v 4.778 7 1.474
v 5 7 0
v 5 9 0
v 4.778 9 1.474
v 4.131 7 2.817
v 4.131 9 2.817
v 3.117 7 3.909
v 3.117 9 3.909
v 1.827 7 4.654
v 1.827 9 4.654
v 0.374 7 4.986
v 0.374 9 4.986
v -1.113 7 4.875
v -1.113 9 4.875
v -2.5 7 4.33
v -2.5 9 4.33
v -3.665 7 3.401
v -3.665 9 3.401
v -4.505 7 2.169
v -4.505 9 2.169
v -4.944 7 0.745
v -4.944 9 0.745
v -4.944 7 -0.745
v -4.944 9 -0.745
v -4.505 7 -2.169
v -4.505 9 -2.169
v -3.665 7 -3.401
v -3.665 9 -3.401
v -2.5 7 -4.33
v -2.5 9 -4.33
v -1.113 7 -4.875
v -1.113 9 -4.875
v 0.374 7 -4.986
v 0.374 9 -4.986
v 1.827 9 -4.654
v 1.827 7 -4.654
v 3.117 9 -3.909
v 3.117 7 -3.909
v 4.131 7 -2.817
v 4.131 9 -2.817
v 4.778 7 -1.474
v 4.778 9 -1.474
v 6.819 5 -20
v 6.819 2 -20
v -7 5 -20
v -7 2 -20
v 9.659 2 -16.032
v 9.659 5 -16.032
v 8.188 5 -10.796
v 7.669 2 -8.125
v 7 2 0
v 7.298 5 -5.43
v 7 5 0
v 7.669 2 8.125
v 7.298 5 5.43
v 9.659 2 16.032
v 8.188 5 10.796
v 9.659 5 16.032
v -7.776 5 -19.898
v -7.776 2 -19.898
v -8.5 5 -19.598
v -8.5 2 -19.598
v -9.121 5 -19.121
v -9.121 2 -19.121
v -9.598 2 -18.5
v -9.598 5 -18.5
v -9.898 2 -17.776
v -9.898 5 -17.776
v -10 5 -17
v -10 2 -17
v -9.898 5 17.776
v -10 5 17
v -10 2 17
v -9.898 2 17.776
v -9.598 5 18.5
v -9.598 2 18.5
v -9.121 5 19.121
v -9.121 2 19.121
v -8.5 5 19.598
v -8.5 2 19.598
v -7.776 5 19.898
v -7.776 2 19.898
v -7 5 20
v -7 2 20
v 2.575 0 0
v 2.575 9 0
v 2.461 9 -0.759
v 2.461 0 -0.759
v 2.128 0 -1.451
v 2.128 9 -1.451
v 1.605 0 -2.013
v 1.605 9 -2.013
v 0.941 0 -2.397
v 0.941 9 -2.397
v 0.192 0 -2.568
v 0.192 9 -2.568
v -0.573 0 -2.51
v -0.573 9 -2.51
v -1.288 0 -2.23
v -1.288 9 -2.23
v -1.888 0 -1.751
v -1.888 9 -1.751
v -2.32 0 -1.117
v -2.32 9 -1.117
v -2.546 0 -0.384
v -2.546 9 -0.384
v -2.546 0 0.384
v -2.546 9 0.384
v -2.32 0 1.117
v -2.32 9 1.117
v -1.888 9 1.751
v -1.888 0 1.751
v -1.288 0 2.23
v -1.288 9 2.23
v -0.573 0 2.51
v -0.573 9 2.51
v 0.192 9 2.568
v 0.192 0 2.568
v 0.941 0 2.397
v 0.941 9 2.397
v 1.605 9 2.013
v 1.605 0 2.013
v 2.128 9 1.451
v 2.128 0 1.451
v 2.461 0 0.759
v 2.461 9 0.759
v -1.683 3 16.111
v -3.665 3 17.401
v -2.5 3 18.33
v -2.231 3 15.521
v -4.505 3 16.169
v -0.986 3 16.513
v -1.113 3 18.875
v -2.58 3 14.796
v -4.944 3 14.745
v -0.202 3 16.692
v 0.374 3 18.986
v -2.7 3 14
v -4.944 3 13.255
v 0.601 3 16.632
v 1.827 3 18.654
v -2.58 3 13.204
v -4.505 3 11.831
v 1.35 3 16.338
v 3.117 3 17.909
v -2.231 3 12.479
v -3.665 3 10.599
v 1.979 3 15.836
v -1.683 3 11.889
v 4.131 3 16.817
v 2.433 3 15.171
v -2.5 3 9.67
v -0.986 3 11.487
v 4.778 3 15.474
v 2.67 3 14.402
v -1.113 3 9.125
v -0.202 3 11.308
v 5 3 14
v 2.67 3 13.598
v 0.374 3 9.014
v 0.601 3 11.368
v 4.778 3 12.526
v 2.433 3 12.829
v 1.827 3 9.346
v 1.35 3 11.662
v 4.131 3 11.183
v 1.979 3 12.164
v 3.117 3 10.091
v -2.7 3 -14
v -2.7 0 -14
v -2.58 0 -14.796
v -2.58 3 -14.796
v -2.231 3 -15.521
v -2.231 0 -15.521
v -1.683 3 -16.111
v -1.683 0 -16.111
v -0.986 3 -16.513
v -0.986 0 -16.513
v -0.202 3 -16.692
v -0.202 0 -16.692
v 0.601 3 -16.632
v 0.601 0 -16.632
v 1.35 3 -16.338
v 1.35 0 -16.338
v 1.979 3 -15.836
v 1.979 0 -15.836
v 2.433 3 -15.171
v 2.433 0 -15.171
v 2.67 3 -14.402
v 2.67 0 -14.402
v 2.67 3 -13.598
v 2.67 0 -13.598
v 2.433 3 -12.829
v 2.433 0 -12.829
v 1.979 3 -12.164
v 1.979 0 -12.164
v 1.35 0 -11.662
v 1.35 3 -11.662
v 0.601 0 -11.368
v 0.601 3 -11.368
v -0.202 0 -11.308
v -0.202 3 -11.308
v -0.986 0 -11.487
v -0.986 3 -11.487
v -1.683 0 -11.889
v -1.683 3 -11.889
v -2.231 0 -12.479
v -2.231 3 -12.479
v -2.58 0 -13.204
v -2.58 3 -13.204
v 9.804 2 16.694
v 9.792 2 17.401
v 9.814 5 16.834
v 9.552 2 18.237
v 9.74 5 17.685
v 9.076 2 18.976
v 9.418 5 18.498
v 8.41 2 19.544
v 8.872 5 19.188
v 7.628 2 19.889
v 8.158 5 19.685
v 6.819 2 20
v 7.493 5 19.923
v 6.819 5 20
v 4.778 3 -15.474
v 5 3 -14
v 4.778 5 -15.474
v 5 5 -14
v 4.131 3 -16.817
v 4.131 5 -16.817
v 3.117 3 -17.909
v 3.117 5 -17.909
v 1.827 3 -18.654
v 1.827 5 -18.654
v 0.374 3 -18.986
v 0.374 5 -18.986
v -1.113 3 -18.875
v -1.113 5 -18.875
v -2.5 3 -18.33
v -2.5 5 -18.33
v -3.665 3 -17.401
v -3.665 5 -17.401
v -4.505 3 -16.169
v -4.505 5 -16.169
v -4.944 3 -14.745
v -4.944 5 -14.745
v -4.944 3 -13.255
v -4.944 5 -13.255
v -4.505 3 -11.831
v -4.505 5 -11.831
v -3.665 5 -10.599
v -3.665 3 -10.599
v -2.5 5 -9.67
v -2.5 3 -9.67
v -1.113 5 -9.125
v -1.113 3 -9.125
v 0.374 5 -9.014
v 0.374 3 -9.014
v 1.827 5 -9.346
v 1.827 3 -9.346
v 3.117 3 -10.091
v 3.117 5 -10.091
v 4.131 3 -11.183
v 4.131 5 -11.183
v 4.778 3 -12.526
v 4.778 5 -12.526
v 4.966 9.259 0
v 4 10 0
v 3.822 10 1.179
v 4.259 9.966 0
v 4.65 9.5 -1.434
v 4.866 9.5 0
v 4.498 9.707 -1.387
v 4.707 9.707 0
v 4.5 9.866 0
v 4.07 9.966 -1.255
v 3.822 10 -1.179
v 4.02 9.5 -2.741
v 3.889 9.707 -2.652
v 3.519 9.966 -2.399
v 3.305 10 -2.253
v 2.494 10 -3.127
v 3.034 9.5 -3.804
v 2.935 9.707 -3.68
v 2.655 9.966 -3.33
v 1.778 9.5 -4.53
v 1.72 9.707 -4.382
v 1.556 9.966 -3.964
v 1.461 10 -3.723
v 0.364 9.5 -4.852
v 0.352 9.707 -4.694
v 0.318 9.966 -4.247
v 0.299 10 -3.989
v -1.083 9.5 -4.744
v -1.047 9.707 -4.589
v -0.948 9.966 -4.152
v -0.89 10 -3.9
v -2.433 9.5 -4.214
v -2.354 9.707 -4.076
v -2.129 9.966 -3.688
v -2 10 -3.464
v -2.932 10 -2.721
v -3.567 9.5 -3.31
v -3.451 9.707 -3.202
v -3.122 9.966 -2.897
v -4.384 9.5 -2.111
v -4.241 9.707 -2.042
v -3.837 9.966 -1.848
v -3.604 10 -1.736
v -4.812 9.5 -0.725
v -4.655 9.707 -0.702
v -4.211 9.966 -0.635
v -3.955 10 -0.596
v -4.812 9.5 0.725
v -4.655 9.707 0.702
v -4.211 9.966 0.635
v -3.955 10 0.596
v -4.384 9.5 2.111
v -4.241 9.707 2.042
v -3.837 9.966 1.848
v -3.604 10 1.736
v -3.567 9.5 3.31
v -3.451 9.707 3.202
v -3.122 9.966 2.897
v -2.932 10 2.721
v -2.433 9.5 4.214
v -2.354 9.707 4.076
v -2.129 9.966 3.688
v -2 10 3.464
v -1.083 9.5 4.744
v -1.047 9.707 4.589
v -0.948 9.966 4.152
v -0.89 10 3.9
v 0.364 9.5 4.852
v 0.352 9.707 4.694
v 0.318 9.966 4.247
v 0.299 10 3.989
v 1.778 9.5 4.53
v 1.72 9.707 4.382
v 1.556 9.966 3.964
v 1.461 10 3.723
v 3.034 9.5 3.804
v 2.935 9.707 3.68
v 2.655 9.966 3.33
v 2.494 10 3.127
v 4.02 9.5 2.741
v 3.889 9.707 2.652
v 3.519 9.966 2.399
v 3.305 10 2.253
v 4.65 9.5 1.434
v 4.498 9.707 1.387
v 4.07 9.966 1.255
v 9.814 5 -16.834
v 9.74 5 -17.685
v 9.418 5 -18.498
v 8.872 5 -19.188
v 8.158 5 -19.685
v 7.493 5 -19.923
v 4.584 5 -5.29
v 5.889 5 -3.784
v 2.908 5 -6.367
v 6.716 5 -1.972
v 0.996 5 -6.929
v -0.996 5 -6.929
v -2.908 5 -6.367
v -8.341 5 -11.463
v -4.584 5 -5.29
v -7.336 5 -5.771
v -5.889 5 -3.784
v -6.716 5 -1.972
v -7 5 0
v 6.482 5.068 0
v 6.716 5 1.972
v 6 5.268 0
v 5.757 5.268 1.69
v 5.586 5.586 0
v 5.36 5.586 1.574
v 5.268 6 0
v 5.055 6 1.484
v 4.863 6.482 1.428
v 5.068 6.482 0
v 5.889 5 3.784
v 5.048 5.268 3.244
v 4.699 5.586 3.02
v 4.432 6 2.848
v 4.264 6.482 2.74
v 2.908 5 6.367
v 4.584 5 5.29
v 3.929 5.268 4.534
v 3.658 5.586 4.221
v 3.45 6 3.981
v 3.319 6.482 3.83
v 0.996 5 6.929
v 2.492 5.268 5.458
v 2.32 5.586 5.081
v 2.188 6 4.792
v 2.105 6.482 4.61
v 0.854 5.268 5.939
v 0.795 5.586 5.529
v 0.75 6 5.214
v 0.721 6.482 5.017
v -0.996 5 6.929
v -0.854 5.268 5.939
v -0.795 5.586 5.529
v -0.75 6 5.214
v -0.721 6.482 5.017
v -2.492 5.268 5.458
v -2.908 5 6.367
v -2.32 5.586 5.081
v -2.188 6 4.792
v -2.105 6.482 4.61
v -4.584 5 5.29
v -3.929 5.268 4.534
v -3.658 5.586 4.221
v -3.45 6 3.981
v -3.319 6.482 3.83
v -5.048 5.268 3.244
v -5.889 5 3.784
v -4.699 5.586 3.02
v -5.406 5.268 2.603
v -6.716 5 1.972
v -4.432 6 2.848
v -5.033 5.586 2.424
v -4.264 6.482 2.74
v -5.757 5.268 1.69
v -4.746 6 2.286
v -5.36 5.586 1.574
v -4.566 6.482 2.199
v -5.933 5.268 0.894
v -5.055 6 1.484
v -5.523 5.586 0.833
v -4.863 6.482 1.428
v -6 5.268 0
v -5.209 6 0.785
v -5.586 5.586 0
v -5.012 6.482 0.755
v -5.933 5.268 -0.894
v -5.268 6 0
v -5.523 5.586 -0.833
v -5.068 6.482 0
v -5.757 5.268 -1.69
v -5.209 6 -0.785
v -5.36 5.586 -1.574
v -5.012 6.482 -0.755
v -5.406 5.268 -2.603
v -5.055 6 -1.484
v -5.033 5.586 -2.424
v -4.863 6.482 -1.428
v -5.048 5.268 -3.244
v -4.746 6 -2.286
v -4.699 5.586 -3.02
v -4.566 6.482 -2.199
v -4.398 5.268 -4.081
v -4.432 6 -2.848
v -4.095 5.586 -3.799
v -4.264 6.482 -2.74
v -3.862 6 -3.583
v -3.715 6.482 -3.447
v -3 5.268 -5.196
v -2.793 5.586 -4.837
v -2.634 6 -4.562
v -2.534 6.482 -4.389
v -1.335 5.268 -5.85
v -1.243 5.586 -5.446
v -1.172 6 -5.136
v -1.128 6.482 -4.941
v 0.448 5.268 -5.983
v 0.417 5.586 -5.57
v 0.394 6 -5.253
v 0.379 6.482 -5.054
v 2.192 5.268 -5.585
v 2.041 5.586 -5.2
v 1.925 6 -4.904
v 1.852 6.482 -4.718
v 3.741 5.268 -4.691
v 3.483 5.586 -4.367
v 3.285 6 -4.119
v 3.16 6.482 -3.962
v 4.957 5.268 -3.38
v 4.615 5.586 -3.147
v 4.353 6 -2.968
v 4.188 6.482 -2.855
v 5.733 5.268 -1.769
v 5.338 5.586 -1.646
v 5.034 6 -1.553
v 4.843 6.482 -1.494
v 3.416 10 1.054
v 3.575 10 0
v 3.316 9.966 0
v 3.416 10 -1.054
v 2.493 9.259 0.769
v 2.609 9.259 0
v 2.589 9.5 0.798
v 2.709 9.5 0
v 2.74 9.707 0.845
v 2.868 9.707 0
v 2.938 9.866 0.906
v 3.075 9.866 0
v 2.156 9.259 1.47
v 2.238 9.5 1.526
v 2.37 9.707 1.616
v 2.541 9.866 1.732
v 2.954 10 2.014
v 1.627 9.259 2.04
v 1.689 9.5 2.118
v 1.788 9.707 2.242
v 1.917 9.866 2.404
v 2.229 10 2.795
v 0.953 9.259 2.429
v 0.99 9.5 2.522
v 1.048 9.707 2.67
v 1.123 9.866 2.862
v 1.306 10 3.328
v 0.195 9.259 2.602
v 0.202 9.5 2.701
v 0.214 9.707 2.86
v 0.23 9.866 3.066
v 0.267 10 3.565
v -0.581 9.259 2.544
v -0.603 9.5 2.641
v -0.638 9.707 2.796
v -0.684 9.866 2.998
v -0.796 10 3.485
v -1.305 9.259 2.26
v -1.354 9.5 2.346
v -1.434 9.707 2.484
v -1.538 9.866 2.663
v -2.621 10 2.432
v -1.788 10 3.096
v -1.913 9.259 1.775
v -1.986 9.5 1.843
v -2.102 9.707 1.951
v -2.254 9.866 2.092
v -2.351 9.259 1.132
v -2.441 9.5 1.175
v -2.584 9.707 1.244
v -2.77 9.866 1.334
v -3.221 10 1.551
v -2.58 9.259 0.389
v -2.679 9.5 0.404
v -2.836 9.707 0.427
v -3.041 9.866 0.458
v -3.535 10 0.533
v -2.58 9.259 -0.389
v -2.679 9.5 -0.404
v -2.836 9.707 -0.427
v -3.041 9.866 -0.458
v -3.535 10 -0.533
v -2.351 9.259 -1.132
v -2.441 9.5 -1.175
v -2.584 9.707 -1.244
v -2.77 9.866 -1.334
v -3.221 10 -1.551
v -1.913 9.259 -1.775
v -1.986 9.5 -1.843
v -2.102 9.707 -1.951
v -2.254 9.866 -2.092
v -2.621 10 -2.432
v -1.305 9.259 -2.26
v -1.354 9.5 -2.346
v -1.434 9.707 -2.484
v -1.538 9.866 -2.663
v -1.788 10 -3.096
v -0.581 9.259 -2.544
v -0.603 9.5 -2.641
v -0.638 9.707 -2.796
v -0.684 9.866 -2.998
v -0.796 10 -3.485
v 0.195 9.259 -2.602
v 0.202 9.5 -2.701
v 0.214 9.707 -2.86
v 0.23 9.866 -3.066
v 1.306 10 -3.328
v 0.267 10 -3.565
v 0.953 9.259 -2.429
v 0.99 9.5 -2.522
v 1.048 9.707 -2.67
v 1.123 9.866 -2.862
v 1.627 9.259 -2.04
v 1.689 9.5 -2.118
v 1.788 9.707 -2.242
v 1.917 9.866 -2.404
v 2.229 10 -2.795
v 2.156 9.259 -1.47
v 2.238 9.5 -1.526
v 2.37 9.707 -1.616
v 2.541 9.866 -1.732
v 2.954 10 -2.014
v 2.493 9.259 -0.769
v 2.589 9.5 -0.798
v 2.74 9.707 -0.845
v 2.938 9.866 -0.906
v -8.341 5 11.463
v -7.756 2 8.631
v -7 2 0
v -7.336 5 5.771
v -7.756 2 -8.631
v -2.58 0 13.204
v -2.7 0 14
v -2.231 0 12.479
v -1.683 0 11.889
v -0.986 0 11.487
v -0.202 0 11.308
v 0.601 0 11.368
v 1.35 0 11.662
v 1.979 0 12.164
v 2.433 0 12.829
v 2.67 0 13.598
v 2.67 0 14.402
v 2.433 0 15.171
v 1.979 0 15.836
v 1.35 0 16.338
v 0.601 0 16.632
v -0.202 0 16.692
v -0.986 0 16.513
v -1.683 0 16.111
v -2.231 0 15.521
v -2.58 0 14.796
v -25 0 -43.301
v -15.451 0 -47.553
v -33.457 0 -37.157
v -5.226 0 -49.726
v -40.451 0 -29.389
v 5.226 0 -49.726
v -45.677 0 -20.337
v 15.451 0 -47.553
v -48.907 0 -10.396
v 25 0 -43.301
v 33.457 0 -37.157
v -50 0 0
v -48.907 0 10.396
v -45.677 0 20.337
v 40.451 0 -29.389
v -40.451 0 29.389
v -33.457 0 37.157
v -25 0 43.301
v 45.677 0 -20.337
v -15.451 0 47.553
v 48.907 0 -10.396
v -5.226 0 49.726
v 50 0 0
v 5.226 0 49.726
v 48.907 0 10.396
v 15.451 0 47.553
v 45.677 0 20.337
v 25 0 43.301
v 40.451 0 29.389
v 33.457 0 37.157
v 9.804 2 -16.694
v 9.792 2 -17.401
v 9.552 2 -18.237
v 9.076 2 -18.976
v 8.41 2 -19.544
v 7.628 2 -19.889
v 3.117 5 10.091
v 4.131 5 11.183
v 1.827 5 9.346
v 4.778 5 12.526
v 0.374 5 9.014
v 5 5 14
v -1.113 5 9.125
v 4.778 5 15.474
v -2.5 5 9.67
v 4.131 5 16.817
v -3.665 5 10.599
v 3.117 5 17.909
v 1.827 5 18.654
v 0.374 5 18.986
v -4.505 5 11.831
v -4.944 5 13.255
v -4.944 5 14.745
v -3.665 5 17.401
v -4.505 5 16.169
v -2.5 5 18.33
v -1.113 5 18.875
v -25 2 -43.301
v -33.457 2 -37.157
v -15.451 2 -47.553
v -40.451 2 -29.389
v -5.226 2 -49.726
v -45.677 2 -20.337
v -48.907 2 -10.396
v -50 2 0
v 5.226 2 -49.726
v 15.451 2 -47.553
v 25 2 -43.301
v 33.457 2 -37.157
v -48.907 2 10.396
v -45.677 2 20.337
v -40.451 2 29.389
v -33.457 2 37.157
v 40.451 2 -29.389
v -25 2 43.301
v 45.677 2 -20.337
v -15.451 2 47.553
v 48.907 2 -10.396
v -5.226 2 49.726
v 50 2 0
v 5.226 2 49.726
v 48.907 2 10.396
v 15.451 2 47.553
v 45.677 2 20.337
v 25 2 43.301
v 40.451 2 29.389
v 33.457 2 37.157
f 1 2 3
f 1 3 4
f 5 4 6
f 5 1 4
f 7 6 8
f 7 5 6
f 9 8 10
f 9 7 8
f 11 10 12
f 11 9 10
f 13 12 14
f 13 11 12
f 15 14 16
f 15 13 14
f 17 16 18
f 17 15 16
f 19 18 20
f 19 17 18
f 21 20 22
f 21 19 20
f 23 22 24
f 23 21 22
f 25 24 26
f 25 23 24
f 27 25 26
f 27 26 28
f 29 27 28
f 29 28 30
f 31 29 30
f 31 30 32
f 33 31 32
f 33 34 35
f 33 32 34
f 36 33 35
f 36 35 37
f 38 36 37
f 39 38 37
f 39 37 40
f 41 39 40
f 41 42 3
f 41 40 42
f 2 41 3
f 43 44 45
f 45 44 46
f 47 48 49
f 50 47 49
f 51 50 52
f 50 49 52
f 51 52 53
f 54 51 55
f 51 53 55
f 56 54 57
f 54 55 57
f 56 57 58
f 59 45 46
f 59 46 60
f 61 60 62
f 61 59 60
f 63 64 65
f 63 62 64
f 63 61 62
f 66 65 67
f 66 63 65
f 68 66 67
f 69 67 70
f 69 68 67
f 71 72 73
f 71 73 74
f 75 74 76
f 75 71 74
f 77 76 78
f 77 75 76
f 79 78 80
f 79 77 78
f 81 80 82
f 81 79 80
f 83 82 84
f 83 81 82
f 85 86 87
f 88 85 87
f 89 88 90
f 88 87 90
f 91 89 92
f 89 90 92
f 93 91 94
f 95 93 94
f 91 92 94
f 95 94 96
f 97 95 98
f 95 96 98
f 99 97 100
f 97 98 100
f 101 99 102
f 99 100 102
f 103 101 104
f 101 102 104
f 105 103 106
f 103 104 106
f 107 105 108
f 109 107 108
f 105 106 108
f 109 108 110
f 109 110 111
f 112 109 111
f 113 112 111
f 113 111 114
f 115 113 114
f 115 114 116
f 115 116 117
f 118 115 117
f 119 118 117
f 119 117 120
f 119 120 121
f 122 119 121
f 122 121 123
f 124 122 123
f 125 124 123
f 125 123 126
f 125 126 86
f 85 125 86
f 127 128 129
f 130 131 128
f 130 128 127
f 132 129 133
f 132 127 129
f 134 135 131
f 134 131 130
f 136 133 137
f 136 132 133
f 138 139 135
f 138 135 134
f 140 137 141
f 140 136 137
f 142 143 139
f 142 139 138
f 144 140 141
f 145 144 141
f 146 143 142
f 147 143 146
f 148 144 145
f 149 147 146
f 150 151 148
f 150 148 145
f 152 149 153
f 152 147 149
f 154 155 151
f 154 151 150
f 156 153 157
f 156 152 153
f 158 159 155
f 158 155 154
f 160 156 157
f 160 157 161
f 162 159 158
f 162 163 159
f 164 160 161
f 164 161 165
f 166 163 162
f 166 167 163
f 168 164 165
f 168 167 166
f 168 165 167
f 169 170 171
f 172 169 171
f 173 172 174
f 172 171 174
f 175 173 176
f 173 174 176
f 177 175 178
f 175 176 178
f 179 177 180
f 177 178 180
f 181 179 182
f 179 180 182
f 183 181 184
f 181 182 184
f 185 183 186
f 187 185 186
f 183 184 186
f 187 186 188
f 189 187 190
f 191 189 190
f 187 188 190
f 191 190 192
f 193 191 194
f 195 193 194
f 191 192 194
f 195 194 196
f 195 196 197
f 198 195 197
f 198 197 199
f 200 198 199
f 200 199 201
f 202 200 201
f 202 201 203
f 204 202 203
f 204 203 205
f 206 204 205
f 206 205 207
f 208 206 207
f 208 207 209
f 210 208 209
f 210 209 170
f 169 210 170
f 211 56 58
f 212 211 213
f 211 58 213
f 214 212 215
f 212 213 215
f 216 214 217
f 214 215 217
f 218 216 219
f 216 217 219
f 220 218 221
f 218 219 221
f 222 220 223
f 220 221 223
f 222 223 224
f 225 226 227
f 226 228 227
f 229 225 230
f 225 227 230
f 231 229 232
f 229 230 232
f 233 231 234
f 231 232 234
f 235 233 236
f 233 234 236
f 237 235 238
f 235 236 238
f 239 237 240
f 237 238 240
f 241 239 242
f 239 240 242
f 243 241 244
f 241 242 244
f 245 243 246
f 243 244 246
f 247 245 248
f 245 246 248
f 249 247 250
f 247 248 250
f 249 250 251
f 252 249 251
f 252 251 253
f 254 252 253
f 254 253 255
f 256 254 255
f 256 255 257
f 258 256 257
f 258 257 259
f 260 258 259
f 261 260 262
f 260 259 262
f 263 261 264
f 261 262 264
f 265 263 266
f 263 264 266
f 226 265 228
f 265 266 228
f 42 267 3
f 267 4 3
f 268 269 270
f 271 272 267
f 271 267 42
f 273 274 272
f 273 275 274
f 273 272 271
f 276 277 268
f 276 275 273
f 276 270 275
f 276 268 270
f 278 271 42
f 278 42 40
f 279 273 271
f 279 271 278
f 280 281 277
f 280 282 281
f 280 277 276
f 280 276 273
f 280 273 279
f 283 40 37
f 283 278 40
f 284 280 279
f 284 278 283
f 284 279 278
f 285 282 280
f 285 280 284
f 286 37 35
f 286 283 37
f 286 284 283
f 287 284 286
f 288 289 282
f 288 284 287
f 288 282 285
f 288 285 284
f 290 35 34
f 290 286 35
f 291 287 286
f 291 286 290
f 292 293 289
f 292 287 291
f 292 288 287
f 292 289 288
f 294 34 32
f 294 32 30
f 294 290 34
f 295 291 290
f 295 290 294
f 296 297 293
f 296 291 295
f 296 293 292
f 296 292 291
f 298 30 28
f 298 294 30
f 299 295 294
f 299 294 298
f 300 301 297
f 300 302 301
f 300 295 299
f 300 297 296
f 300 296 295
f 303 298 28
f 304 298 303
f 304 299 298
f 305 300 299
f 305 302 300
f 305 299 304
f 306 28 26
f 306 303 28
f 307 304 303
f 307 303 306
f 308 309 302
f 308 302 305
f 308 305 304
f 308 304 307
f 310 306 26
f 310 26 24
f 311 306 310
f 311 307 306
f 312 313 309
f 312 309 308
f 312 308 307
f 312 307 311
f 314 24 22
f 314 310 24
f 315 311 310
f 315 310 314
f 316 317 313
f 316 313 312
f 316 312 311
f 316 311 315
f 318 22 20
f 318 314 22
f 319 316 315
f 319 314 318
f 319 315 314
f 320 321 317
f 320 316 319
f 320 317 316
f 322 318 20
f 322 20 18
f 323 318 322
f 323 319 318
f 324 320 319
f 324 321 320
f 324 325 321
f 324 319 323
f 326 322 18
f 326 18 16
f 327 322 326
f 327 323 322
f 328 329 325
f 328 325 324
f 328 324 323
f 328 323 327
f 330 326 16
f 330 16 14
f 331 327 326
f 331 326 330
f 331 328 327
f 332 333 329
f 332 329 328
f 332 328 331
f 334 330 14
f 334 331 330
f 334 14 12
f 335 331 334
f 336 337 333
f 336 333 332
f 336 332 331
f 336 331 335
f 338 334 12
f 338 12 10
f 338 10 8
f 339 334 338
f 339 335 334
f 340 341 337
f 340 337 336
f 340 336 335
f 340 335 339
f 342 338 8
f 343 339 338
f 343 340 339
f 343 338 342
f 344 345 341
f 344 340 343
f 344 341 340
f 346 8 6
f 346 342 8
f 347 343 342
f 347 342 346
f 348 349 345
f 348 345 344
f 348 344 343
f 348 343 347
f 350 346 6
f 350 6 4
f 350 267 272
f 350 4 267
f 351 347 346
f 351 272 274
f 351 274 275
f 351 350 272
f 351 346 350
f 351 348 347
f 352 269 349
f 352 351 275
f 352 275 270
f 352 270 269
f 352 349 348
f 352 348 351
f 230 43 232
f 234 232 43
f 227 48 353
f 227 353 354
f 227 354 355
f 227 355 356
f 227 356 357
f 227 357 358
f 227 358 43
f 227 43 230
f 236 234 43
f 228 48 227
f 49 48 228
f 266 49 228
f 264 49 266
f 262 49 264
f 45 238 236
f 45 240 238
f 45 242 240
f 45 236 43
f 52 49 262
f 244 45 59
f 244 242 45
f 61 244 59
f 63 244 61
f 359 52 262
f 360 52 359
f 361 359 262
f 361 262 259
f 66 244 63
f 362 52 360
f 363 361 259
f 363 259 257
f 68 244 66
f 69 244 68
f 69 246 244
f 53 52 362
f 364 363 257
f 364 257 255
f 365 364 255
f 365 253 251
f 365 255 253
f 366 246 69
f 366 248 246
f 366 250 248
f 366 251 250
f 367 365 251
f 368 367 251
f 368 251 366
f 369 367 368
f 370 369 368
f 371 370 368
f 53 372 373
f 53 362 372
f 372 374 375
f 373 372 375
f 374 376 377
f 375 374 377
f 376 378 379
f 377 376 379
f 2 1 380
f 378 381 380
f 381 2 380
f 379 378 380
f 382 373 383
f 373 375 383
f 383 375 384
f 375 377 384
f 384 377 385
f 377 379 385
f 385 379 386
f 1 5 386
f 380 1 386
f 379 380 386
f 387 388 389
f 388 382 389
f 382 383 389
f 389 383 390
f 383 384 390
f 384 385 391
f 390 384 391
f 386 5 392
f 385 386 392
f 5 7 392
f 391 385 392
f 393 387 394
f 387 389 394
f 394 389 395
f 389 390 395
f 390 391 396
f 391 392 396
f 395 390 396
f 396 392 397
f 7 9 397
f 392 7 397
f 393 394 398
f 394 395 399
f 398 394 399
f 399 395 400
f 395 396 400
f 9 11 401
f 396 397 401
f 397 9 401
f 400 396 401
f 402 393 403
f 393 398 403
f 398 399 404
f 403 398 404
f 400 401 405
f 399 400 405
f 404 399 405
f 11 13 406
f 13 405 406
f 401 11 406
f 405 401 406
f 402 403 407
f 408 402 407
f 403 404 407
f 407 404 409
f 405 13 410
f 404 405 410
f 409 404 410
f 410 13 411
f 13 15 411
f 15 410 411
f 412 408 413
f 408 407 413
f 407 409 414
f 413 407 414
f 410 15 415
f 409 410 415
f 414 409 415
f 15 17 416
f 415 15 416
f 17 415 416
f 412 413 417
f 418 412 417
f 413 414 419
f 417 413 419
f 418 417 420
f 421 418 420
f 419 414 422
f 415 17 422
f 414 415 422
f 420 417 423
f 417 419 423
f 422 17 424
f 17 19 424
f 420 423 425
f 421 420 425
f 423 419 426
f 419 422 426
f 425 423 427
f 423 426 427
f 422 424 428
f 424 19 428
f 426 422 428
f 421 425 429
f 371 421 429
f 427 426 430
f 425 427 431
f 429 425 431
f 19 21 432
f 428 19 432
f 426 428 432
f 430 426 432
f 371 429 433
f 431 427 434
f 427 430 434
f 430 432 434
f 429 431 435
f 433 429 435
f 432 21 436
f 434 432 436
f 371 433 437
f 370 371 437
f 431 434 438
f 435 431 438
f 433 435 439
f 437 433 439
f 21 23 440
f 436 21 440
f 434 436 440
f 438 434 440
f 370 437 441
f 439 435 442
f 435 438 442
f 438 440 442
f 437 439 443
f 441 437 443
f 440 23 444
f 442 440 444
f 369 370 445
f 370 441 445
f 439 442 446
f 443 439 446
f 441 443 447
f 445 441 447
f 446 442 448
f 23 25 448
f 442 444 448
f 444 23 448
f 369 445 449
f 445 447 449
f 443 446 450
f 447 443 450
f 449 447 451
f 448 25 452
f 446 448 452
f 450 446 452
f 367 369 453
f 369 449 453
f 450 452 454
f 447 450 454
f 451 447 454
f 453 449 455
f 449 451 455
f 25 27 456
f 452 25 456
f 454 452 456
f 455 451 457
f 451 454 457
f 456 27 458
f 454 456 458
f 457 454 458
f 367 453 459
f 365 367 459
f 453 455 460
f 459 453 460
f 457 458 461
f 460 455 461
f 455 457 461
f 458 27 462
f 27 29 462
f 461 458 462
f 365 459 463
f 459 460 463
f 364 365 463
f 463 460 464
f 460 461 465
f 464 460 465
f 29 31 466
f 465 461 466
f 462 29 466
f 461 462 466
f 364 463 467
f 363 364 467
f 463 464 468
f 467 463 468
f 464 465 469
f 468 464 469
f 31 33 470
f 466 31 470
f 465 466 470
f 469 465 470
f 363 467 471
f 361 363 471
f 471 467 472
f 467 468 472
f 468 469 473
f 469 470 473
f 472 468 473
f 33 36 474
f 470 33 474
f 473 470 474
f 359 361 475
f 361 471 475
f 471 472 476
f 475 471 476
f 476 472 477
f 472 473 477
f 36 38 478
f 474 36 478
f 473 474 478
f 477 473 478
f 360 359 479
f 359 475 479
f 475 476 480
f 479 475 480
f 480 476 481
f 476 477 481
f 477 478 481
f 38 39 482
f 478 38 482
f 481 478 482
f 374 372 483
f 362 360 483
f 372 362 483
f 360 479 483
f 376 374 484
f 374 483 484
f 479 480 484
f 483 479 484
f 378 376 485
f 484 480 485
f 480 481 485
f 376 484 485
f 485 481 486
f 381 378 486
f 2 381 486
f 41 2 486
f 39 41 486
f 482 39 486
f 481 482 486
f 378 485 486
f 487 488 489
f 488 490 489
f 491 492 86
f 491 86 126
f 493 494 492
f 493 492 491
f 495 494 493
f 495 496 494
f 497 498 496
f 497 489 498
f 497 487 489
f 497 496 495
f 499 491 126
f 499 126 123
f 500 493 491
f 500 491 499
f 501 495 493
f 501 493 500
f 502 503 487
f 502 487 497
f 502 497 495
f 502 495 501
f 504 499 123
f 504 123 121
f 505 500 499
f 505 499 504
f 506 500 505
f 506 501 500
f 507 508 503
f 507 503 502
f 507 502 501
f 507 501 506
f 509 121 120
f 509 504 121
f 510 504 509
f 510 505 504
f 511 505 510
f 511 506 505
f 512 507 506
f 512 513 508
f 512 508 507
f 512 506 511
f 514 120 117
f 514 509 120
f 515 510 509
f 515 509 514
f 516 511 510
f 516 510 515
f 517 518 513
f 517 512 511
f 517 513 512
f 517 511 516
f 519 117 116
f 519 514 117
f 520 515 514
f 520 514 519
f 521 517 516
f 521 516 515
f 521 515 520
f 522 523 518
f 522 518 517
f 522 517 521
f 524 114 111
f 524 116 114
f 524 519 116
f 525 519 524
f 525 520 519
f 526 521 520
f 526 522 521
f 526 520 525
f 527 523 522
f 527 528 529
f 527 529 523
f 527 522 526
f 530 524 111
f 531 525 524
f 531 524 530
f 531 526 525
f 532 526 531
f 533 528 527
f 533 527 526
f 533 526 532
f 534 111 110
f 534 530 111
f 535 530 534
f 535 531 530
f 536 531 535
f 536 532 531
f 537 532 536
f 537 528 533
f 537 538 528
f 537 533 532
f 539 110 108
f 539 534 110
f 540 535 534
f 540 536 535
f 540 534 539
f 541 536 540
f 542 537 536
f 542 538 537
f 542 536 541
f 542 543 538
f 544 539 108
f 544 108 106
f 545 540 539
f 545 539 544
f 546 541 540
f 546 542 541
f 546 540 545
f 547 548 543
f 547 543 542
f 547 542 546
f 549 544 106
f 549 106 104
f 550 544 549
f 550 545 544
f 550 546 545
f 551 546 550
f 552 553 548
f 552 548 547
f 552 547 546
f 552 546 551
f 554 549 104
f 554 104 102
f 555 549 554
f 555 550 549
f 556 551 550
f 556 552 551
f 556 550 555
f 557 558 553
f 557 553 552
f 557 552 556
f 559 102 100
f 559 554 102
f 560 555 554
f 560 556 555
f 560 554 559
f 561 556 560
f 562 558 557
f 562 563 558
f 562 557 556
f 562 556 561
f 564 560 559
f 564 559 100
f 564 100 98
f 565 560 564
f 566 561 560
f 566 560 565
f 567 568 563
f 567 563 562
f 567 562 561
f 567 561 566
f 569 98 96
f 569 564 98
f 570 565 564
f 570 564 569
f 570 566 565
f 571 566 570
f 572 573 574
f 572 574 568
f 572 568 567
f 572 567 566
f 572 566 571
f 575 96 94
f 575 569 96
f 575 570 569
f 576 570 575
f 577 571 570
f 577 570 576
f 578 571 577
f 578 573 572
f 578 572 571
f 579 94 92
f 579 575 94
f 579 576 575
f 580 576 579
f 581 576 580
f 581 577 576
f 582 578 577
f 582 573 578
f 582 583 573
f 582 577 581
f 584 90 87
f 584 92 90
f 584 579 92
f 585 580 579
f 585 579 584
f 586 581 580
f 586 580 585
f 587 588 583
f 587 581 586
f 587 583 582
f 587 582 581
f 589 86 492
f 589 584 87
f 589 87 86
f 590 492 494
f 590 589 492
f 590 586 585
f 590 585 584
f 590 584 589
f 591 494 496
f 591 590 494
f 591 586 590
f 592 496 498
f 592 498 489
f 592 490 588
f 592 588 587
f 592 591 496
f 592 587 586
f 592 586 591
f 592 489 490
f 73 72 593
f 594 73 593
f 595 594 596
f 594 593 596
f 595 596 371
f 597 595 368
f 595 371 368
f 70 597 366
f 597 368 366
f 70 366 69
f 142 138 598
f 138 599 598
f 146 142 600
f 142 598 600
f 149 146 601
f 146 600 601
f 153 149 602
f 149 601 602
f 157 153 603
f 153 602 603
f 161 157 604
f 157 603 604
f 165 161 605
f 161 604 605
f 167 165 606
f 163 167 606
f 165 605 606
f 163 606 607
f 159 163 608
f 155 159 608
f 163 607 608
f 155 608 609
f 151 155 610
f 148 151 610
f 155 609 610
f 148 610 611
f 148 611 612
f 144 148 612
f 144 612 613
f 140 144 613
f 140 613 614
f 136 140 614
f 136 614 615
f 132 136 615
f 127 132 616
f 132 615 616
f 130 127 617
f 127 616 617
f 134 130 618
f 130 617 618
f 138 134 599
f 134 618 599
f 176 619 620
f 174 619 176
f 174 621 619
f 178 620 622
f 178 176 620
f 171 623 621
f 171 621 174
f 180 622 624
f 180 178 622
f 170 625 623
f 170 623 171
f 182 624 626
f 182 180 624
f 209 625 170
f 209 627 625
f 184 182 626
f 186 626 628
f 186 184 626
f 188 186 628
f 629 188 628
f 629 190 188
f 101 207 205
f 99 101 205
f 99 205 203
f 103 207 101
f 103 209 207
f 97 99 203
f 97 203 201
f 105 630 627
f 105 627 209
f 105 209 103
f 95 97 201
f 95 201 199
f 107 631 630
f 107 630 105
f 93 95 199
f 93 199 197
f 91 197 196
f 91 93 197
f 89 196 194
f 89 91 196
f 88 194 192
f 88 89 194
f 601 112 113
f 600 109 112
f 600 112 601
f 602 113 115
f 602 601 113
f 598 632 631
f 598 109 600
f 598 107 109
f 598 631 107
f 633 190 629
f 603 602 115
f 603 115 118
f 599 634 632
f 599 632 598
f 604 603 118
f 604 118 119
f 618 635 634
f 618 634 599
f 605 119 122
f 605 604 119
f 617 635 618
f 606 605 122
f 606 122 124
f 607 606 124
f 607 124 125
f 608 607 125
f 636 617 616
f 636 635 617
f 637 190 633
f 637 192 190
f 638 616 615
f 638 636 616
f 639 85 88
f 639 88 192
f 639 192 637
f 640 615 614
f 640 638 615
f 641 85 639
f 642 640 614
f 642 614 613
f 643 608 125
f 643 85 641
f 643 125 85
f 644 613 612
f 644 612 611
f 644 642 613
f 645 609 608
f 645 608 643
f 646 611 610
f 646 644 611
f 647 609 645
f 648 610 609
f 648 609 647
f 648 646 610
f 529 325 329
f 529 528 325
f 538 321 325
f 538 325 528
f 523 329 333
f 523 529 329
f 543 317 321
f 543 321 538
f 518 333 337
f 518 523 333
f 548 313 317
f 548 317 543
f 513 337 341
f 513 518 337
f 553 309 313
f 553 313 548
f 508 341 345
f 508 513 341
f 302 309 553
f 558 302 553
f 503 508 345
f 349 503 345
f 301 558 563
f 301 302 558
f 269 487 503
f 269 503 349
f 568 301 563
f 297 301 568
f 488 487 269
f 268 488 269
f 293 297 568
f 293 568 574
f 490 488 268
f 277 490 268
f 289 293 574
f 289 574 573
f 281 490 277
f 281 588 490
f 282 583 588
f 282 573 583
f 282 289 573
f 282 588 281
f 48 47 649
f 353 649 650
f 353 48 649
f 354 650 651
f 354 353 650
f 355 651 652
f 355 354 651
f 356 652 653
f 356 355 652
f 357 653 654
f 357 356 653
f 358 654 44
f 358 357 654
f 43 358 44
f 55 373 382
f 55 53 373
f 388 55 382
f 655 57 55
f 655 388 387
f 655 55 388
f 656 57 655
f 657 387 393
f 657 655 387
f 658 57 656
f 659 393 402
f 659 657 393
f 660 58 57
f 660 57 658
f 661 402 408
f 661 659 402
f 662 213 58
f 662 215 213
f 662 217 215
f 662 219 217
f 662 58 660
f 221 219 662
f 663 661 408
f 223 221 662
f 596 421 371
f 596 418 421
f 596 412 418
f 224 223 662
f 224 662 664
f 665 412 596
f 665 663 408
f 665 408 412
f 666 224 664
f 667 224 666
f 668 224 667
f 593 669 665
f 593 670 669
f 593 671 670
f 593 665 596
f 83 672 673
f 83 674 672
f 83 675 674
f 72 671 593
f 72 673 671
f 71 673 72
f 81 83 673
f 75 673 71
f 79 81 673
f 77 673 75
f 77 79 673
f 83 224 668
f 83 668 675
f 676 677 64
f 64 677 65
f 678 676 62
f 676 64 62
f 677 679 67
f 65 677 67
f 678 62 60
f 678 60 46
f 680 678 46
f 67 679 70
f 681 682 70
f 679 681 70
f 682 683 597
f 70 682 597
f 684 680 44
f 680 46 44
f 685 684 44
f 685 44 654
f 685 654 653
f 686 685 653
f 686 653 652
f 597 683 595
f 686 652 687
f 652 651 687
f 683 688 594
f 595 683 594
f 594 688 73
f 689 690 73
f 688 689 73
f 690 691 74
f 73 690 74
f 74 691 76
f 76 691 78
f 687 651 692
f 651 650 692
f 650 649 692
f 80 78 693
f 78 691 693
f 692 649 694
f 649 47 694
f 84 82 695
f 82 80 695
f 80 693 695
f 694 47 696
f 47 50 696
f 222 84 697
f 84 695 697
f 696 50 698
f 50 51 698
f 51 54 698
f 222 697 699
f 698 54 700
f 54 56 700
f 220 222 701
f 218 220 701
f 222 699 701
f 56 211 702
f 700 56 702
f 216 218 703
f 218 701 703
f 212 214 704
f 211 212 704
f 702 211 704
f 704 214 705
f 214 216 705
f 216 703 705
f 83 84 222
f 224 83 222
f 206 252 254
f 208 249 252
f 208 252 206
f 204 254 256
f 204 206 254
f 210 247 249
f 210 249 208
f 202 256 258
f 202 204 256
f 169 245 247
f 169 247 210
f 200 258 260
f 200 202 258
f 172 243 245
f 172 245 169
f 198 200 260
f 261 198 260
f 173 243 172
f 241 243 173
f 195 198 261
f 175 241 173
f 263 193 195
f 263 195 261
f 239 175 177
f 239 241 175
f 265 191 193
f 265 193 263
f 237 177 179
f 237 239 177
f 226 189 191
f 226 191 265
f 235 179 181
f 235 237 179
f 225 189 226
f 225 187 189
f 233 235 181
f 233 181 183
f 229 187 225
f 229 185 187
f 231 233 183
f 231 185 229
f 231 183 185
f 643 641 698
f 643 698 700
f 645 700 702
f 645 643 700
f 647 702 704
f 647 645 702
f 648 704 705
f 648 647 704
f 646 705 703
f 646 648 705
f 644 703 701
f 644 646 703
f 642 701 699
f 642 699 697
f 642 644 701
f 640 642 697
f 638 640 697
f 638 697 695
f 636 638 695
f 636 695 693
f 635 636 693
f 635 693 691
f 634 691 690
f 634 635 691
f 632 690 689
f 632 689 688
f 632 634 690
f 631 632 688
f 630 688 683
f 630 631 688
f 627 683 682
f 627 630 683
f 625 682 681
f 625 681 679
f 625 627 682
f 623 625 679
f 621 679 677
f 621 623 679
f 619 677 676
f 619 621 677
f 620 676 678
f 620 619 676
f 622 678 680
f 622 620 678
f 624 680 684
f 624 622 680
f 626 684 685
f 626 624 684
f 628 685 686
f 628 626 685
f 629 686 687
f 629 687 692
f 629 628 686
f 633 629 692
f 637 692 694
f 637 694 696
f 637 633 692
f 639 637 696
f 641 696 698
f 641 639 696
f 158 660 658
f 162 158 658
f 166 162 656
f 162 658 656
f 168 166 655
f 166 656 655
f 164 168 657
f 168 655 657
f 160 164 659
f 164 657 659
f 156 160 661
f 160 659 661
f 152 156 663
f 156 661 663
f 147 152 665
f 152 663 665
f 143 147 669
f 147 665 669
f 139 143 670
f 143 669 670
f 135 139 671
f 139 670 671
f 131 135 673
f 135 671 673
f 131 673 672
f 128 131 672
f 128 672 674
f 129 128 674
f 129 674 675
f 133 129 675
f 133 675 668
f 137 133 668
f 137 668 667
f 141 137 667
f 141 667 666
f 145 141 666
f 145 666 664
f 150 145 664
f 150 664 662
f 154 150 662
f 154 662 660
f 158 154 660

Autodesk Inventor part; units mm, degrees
ref_plane "YZ Plane" through (0, 0, 0) normal (1, 0, 0) x (0, 1, 0)
ref_plane "XZ Plane" through (0, 0, 0) normal (0, 1, 0) x (-1, 0, 0)
ref_plane "XY Plane" through (0, 0, 0) normal (0, 0, 1) x (1, 0, 0)
sketch "Boceto1" plane through (0, 0, 0) normal (0, 1, 0) x (-1, 0, 0)
  circle A0 centre (0, 0) radius 2.7
  line L0 (10, 20) -> (-10, 20)
  line L1 (-10, 20) -> (-10, -20)
  line L2 (-10, -20) -> (10, -20)
  line L3 (10, -20) -> (10, 20)
  line L4 (10, 20) -> (-10, -20) construction
  line L5 (-10, 20) -> (10, -20) construction
  circle A1 centre (0, 14) radius 2.7
  circle A2 centre (0, -14) radius 2.7
  dimension "d0" = 5.4
  dimension "d1" = 20
  dimension "d2" = 40
  dimension "d3" = 6
  dimension "d4" = 6
extrude "Extrusión1" add sketch "Boceto1" along normal blind 5
sketch "Boceto2" plane through (0, 5, 0) normal (0, 1, 0) x (1, 0, 0)
  circle A0 centre (0, 0) radius 2.7 projected
  circle A1 centre (0, 0) radius 2.7 projected
  circle A2 centre (0, 0) radius 5
  dimension "d21" = 2
  dimension "d22" = 0
  dimension "d7" = 10
extrude "Extrusión2" add sketch "Boceto2" along normal blind 5
sketch "Boceto3" plane through (0, 10, 0) normal (0, 1, 0) x (1, 0, 0)
  circle A0 centre (0, 0) radius 2.575
  circle A1 centre (0, 0) radius 2.7 projected
  dimension "d10" = 5.15
extrude "Extrusión3" add sketch "Boceto3" against normal up to surface (10 mm away)
fillet "Empalme1" radius 3 4 edges at (-10, 2.5, -20) (10, 2.5, -20) (10, 2.5, 20) (-10, 2.5, 20)
fillet "Empalme2" radius 2 1 edges at (-5, 5, 0)
sketch "Boceto4" plane through (0, 5, 0) normal (0, 1, 0) x (1, 0, 0)
  line L0 (10, -17) -> (10, 17) projected
  arc A0 (10, 17) -> (10, -17) centre (56.6667, 0) ccw
  line L1 (10, -17) -> (10, 17) projected
  line L2 (-10, 17) -> (-10, -17) projected
  arc A1 (-7, 20) -> (-10, 17) centre (-7, 17) ccw projected
  arc A2 (-10, -17) -> (-10, 17) centre (-56.6667, 0) ccw
  line L3 (-10, 17) -> (-10, -17) projected
  point P0 (0, 0)
extrude "Extrusión4" cut sketch "Boceto4" against normal through all
fillet "Empalme3" radius 3 2 edges at (10, 2.5, 17) (10, 2.5, -17)
fillet "Empalme4" radius 1 2 edges at (-5, 10, 0) (-2.575, 10, 0)
sketch "Boceto5" plane through (0, 5, 0) normal (0, 1, 0) x (1, 0, 0)
  circle A0 centre (0, -14) radius 2.7 projected
  circle A1 centre (0, -14) radius 5
  circle A2 centre (0, 14) radius 2.7 projected
  circle A3 centre (0, 14) radius 5
  point P0 (0, 0)
  dimension "d19" = 10
  dimension "d20" = 10
extrude "Extrusión5" cut sketch "Boceto5" against normal blind 2 contours A0 | A1 | A2 | A3
sketch "Boceto7" plane through (0, 0, 0) normal (0, -1, 0) x (1, 0, 0)
  circle A0 centre (0, 0) radius 2.575 projected
  circle A1 centre (0, 0) radius 50
  circle A2 centre (0, -14) radius 2.7 projected
  circle A3 centre (0, 14) radius 2.7 projected
  circle A4 centre (0, 0) radius 2.575 projected
  arc A5 (6.8191, -20) -> (9.6585, -16.0316) centre (6.8191, -17) ccw projected
  arc A6 (9.6585, 16.0316) -> (9.6585, -16.0316) centre (56.6667, 0) ccw projected
  arc A7 (9.6585, 16.0316) -> (6.8191, 20) centre (6.8191, 17) ccw projected
  line L0 (-7, 20) -> (6.8191, 20) projected
  arc A8 (-7, 20) -> (-10, 17) centre (-7, 17) ccw projected
  arc A9 (-10, -17) -> (-10, 17) centre (-56.6667, 0) ccw projected
  arc A10 (-10, -17) -> (-7, -20) centre (-7, -17) ccw projected
  line L1 (6.8191, -20) -> (-7, -20) projected
  dimension "d24" = 100
extrude "Extrusión6" add sketch "Boceto7" against normal blind 2 contours A1
properties part number "plataforma"
